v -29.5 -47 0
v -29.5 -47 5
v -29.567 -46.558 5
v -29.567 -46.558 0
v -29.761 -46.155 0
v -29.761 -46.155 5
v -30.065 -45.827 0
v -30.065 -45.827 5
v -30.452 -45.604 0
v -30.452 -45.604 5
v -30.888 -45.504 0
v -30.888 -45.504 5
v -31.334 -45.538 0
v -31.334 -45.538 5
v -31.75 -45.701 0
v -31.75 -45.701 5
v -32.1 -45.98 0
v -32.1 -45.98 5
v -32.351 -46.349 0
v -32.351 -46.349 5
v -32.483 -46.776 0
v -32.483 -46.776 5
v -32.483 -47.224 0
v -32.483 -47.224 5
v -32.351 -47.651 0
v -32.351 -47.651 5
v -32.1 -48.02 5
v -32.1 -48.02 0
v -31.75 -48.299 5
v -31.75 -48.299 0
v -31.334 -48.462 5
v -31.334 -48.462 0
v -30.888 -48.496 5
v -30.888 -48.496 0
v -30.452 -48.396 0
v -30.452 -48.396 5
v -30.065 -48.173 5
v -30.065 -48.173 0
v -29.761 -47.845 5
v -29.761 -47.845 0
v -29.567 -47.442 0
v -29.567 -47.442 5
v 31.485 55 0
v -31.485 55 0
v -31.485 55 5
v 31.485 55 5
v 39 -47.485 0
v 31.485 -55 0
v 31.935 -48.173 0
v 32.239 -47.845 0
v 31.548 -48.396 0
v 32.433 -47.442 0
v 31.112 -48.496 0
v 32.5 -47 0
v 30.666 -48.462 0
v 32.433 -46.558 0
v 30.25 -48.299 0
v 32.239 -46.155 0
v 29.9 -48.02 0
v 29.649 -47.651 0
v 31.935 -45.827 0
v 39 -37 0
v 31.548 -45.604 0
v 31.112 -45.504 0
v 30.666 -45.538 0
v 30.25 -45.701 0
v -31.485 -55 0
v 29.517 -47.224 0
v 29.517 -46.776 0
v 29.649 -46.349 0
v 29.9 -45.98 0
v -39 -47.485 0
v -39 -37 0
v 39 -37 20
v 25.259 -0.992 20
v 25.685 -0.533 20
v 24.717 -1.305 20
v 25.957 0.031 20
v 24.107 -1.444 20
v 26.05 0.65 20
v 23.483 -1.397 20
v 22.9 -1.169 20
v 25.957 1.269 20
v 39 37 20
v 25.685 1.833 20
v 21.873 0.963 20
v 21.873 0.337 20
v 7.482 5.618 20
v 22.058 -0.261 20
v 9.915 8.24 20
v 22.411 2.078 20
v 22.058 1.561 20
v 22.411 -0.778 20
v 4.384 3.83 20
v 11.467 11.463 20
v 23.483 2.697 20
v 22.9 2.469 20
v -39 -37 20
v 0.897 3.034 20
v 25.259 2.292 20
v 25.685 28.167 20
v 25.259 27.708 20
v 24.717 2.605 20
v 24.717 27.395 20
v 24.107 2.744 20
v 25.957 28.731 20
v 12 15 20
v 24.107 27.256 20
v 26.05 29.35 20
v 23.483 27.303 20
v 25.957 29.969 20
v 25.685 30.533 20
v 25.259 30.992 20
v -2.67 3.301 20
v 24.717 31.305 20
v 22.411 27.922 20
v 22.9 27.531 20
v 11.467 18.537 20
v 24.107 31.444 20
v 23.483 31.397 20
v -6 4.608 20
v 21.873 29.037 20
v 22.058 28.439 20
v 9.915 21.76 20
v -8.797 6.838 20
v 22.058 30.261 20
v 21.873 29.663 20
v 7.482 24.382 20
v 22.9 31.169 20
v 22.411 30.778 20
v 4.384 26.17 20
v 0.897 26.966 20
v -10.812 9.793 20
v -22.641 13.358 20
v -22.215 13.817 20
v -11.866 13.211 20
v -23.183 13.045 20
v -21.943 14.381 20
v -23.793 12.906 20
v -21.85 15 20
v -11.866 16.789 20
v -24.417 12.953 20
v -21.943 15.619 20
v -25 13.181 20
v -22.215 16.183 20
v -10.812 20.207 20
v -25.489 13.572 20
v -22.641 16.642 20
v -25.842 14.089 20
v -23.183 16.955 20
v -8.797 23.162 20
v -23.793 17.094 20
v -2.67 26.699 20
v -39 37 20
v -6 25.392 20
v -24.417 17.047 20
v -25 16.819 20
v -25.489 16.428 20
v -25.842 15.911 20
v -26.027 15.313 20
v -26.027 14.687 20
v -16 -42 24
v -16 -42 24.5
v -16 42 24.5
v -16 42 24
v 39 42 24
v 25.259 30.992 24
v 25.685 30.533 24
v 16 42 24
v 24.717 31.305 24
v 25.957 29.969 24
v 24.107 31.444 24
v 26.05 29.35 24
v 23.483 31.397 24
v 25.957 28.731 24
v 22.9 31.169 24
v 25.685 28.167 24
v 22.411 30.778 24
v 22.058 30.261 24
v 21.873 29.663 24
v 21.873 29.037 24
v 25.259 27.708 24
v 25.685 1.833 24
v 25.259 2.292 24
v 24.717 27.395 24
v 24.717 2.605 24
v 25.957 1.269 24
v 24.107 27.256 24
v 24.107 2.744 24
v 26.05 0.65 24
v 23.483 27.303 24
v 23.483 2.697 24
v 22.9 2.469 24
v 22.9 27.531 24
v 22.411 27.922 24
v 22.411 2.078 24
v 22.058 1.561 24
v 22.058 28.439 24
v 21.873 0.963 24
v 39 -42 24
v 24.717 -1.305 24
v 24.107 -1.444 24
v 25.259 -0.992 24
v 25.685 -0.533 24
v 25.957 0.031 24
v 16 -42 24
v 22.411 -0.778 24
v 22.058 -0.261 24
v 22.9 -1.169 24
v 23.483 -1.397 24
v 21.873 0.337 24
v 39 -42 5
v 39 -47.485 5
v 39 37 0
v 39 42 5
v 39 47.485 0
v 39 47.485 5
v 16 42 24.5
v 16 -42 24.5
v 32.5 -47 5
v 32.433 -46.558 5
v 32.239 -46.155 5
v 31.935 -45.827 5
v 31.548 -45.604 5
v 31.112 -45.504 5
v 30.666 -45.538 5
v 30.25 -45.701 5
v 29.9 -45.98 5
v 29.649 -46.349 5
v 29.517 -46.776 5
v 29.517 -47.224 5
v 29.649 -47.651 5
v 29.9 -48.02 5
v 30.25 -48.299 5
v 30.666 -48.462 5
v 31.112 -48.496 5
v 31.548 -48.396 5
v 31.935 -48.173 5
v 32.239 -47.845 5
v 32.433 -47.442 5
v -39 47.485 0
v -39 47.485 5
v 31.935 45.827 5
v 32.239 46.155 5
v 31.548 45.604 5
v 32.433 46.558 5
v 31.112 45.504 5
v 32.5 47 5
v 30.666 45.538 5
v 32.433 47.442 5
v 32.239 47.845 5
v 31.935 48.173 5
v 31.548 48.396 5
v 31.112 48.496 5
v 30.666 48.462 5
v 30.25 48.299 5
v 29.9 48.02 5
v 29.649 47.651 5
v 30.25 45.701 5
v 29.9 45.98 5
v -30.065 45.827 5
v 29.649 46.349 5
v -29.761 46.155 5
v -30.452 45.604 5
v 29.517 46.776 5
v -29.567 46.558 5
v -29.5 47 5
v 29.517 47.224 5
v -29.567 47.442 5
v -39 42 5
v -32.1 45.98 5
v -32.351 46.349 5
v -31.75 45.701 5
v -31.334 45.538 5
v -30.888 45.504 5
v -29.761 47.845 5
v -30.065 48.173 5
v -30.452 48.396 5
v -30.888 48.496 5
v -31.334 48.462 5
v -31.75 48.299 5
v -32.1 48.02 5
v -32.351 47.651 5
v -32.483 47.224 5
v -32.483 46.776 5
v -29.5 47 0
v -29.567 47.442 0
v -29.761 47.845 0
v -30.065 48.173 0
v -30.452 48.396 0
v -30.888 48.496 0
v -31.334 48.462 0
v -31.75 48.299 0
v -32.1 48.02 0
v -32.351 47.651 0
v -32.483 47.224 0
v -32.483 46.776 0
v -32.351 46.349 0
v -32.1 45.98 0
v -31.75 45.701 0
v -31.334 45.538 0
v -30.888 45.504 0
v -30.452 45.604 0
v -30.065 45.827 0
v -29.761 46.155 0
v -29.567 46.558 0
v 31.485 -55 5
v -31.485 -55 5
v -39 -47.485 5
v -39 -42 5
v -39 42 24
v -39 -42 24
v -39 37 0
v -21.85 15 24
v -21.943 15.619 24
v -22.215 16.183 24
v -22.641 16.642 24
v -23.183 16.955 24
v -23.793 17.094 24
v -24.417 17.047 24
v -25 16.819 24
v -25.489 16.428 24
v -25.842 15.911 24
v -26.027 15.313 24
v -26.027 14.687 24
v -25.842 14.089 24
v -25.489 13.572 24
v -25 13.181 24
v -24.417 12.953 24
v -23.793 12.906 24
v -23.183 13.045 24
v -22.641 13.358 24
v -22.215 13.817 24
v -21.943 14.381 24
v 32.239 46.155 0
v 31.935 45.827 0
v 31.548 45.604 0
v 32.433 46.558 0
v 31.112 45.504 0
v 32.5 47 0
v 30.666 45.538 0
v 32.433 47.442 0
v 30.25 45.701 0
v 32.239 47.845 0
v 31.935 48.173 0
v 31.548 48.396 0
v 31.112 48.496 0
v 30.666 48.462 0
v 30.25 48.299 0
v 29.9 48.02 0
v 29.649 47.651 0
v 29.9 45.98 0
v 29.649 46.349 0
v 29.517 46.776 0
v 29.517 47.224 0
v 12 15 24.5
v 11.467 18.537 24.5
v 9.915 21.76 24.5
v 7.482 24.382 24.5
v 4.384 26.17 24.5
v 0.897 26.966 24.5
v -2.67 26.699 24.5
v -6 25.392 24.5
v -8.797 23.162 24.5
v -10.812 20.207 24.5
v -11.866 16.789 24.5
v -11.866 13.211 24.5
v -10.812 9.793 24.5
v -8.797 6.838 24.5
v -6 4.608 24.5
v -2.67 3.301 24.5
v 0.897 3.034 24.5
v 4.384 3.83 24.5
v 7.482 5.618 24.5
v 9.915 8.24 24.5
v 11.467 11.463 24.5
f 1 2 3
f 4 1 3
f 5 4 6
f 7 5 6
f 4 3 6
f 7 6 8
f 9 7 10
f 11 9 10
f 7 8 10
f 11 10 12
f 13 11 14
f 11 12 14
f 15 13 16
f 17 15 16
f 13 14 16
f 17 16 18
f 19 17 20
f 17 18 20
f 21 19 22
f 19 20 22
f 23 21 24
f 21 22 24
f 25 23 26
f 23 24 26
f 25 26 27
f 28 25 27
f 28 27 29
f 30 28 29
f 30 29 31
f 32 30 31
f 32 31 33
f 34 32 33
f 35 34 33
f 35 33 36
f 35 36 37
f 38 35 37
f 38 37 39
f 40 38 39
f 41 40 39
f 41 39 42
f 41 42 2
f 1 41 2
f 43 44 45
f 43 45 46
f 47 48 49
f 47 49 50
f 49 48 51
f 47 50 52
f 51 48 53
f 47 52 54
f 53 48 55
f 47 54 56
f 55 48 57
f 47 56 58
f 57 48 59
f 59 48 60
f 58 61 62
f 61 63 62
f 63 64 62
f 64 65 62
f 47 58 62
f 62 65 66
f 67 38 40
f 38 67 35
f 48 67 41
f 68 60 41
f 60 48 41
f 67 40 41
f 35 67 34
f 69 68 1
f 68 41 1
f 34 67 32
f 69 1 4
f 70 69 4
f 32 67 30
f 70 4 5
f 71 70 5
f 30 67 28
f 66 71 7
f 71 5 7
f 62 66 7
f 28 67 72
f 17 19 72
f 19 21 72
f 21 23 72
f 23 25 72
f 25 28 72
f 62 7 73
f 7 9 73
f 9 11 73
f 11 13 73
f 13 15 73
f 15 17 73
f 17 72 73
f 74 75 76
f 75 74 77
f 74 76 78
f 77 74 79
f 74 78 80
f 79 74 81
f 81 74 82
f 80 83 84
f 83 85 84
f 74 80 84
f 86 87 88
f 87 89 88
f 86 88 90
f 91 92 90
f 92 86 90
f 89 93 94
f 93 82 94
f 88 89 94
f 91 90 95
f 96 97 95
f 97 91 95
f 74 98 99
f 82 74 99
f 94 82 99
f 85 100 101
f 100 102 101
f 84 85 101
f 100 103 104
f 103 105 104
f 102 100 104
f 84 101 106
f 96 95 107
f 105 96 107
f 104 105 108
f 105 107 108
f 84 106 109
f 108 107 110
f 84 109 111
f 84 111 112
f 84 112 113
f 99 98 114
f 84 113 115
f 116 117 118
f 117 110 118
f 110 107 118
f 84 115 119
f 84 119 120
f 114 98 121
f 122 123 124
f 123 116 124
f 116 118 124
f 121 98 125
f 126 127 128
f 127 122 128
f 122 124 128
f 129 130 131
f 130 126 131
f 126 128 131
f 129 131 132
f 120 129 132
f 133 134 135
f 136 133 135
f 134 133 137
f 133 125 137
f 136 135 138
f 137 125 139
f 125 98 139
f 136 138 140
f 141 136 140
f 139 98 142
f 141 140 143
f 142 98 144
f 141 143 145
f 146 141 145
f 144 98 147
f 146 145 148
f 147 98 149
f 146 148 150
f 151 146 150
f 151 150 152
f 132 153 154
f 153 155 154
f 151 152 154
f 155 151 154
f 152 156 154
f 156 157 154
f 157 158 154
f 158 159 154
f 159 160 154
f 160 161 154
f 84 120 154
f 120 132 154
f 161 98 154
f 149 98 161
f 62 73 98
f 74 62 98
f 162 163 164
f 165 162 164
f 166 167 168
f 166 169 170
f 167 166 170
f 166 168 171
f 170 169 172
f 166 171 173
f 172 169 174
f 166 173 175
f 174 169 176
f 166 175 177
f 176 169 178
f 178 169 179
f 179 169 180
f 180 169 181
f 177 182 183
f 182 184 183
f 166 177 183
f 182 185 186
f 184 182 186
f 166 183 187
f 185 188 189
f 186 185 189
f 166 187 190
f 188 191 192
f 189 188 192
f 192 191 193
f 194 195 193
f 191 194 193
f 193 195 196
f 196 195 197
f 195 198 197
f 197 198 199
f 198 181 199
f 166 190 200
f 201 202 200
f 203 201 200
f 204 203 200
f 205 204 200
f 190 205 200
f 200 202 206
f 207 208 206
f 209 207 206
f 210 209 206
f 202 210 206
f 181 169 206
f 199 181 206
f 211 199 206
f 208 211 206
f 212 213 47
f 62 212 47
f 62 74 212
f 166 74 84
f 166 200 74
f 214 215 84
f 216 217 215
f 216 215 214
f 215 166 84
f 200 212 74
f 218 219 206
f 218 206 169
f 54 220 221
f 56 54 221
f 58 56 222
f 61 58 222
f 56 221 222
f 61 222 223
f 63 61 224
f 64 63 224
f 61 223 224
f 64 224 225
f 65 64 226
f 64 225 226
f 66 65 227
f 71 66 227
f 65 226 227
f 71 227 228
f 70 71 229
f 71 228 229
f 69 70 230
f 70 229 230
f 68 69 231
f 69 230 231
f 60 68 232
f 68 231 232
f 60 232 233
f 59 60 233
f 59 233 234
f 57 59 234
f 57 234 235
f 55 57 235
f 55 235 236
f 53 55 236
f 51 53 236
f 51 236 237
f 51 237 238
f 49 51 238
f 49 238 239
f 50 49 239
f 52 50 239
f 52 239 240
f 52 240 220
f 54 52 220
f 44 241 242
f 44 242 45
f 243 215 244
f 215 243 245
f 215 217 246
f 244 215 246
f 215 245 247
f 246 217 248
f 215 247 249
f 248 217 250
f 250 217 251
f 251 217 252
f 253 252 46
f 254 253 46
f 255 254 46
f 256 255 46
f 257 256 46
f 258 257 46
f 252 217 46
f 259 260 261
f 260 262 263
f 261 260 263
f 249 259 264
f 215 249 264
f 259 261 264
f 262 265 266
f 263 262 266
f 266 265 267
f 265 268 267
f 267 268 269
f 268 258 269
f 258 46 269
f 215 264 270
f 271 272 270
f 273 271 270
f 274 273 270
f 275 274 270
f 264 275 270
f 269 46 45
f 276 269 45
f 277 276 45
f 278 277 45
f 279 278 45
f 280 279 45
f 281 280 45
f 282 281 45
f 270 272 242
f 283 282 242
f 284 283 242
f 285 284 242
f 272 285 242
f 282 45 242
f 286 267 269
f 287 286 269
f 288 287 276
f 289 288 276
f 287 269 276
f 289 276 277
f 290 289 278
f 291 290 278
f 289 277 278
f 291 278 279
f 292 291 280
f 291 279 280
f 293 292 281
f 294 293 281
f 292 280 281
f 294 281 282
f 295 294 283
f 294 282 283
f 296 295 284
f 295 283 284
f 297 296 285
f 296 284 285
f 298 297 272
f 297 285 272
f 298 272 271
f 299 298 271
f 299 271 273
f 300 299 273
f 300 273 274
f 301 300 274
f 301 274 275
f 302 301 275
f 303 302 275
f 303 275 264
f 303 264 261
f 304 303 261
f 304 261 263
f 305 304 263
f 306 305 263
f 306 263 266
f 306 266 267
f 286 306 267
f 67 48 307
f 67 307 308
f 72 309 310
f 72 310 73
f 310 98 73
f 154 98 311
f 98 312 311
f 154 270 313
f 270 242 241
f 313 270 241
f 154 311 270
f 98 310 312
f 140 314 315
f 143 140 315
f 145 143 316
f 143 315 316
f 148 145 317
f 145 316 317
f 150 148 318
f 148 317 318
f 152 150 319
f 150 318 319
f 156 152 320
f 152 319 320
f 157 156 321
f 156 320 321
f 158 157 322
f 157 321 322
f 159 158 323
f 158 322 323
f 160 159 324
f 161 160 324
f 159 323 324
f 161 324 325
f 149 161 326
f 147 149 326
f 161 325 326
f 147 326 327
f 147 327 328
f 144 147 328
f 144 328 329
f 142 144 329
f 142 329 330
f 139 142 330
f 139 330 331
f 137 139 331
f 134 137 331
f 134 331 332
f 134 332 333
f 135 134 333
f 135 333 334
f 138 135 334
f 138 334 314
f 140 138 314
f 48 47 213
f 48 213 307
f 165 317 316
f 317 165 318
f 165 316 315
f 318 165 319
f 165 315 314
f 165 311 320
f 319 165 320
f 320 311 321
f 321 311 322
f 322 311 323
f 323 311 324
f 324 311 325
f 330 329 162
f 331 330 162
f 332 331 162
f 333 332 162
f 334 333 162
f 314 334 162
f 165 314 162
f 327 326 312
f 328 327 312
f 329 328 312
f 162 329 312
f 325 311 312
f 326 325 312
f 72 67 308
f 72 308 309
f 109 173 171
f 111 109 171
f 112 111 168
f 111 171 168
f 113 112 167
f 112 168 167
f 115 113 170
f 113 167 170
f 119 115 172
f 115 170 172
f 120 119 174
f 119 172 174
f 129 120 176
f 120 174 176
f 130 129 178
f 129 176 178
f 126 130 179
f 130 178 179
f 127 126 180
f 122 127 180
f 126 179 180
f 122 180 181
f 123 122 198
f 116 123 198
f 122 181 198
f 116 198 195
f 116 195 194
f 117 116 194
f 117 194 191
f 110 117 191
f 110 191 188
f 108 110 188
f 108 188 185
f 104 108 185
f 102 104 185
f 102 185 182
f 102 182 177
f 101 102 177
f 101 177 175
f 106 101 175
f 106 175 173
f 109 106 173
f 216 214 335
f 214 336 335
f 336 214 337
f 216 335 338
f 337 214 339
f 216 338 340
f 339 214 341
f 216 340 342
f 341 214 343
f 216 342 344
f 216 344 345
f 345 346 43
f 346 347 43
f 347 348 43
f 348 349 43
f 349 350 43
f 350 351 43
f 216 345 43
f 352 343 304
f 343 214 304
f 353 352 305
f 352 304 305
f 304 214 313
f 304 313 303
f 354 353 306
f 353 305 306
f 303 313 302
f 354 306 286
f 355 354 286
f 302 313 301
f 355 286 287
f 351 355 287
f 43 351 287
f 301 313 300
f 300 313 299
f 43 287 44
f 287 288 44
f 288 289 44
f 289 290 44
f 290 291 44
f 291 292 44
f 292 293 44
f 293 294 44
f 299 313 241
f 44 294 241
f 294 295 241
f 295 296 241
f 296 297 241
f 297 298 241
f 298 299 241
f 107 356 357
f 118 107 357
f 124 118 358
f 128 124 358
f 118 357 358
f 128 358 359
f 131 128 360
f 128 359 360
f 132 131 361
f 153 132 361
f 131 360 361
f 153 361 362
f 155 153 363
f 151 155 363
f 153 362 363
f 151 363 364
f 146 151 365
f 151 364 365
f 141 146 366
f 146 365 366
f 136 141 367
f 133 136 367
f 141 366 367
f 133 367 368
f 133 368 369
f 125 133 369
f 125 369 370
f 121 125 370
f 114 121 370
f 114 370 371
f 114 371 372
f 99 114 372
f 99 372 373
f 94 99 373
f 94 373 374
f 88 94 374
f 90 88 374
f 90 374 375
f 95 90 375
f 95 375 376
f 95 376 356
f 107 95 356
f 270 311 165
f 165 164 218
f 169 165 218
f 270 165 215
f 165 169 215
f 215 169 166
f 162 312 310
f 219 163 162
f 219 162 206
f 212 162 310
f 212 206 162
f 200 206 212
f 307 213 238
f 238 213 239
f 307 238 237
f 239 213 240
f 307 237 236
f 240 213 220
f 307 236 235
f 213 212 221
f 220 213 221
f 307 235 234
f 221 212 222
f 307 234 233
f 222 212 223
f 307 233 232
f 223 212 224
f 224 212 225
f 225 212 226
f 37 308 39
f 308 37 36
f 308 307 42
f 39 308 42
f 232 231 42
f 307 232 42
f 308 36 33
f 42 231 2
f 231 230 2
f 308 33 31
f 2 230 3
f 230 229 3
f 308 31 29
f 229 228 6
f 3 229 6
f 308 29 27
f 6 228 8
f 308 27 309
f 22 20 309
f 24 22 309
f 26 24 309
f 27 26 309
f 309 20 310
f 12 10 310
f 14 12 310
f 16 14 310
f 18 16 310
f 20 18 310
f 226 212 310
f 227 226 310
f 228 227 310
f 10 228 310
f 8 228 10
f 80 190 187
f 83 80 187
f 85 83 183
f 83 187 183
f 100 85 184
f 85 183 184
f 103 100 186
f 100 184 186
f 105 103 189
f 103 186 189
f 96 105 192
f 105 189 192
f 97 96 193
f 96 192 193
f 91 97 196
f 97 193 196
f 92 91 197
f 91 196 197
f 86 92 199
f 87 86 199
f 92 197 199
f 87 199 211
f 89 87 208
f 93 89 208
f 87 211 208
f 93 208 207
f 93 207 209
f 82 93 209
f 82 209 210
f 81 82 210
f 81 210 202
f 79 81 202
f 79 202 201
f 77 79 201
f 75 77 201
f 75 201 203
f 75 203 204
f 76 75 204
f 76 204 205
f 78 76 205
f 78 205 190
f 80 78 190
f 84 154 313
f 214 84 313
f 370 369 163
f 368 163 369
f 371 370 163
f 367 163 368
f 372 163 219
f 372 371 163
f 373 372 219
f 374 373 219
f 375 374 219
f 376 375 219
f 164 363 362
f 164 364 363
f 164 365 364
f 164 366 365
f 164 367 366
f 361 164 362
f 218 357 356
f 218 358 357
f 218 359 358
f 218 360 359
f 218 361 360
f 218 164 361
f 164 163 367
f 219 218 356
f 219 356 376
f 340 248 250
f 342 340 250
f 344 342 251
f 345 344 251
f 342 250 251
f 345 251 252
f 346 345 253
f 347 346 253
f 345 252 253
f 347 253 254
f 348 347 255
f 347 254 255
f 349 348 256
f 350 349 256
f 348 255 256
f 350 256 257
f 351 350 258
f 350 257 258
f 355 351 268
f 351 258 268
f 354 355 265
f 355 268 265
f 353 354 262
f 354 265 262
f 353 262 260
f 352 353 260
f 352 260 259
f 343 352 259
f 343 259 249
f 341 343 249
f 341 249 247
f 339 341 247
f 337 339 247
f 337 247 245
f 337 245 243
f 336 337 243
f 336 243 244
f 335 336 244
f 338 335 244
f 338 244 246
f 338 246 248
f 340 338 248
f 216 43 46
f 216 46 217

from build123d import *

# Parameters (mm, degrees)
EXTRUDE_1_DEPTH     = 5
EXTRUDE_1_2_DEPTH   = 5
EXTRUDE_2_DEPTH     = 78
CUT_EXTRUDE_1_REACH = 73.568
SKETCH_4_R          = 12
EXTRUDE_START       = 0.5
SKETCH_5_W          = 32
SKETCH_5_H          = 84
SKETCH_5_R          = 12
EXTRUDE_3_DEPTH     = 0.5
CUT_EXTRUDE_2_REACH = 73.568
SKETCH_6_R          = 2.1
CUT_EXTRUDE_3_REACH = 72.187
SKETCH_7_R          = 1.5


with BuildPart() as part:
    # 草图2 → 凸台-拉伸1 (new body)
    with BuildSketch(Plane.XY):
        Polygon((39, 42), (-39, 42), (-39, 47.485281374), (-31.485281374, 55), (31.485281374, 55), (39, 47.485281374), align=None)
    extrude(amount=EXTRUDE_1_DEPTH)



with BuildPart() as body_2:
    # 草图2 → Extrude 1 2 (new body)
    with BuildSketch(Plane.XY):
        Polygon((31.485281374, -55), (-31.485281374, -55), (-39, -47.485281374), (-39, -42), (39, -42), (39, -47.485281374), align=None)
    extrude(amount=EXTRUDE_1_2_DEPTH)


with BuildPart() as part_1:
    add(part.part)

    add(body_2.part)  # 凸台-拉伸2 merges body 2
    # 草图3 → 凸台-拉伸2 (add)
    with BuildSketch(Plane.ZY.offset(39)):
        Polygon((0, 42), (24, 42), (24, -42), (0, -42), (0, -37), (20, -37), (20, 37), (0, 37), align=None)
    extrude(amount=-EXTRUDE_2_DEPTH)

    # 草图4 → 切除-拉伸1 (cut, up to next)
    with BuildSketch(Plane.XY.offset(24), mode=Mode.PRIVATE) as cut_extrude_1_sk1:
        with Locations((0, 15)):
            Circle(SKETCH_4_R)
    cut_extrude_1_tool1 = extrude(cut_extrude_1_sk1.sketch, amount=-CUT_EXTRUDE_1_REACH, mode=Mode.PRIVATE) & part_1.part
    add(cut_extrude_1_tool1.solids().sort_by_distance((0, 15, 24))[0], mode=Mode.SUBTRACT)

    # 草图5 → 凸台-拉伸3 (add)
    with BuildSketch(Plane.XY.offset(24).offset(EXTRUDE_START)):
        Rectangle(SKETCH_5_W, SKETCH_5_H)
        with Locations((0, 15)):
            Circle(SKETCH_5_R, mode=Mode.SUBTRACT)
    extrude(amount=-EXTRUDE_3_DEPTH)

    # 草图6 → 切除-拉伸2 (cut, up to next)
    with BuildSketch(Plane.XY.offset(24), mode=Mode.PRIVATE) as cut_extrude_2_sk1:
        with Locations((-23.95, 15)):
            Circle(SKETCH_6_R)
    cut_extrude_2_tool1 = extrude(cut_extrude_2_sk1.sketch, amount=-CUT_EXTRUDE_2_REACH, mode=Mode.PRIVATE) & part_1.part
    # 草图6 → 切除-拉伸2 (cut, up to next)
    with BuildSketch(Plane.XY.offset(24), mode=Mode.PRIVATE) as cut_extrude_2_sk2:
        with Locations((23.95, 29.35)):
            Circle(SKETCH_6_R)
    cut_extrude_2_tool2 = extrude(cut_extrude_2_sk2.sketch, amount=-CUT_EXTRUDE_2_REACH, mode=Mode.PRIVATE) & part_1.part
    # 草图6 → 切除-拉伸2 (cut, up to next)
    with BuildSketch(Plane.XY.offset(24), mode=Mode.PRIVATE) as cut_extrude_2_sk3:
        with Locations((23.95, 0.65)):
            Circle(SKETCH_6_R)
    cut_extrude_2_tool3 = extrude(cut_extrude_2_sk3.sketch, amount=-CUT_EXTRUDE_2_REACH, mode=Mode.PRIVATE) & part_1.part
    add(cut_extrude_2_tool1.solids().sort_by_distance((-23.95, 15, 24))[0], mode=Mode.SUBTRACT)
    add(cut_extrude_2_tool2.solids().sort_by_distance((23.95, 29.35, 24))[0], mode=Mode.SUBTRACT)
    add(cut_extrude_2_tool3.solids().sort_by_distance((23.95, 0.65, 24))[0], mode=Mode.SUBTRACT)

    # 草图7 → 切除-拉伸3 (cut, up to next)
    with BuildSketch(Plane.XY.offset(5), mode=Mode.PRIVATE) as cut_extrude_3_sk1:
        with Locations((-31, 47)):
            Circle(SKETCH_7_R)
    cut_extrude_3_tool1 = extrude(cut_extrude_3_sk1.sketch, amount=-CUT_EXTRUDE_3_REACH, mode=Mode.PRIVATE) & part_1.part
    # 草图7 → 切除-拉伸3 (cut, up to next)
    with BuildSketch(Plane.XY.offset(5), mode=Mode.PRIVATE) as cut_extrude_3_sk2:
        with Locations((31, 47)):
            Circle(SKETCH_7_R)
    cut_extrude_3_tool2 = extrude(cut_extrude_3_sk2.sketch, amount=-CUT_EXTRUDE_3_REACH, mode=Mode.PRIVATE) & part_1.part
    # 草图7 → 切除-拉伸3 (cut, up to next)
    with BuildSketch(Plane.XY.offset(5), mode=Mode.PRIVATE) as cut_extrude_3_sk3:
        with Locations((31, -47)):
            Circle(SKETCH_7_R)
    cut_extrude_3_tool3 = extrude(cut_extrude_3_sk3.sketch, amount=-CUT_EXTRUDE_3_REACH, mode=Mode.PRIVATE) & part_1.part
    # 草图7 → 切除-拉伸3 (cut, up to next)
    with BuildSketch(Plane.XY.offset(5), mode=Mode.PRIVATE) as cut_extrude_3_sk4:
        with Locations((-31, -47)):
            Circle(SKETCH_7_R)
    cut_extrude_3_tool4 = extrude(cut_extrude_3_sk4.sketch, amount=-CUT_EXTRUDE_3_REACH, mode=Mode.PRIVATE) & part_1.part
    add(cut_extrude_3_tool1.solids().sort_by_distance((-31, 47, 5))[0], mode=Mode.SUBTRACT)
    add(cut_extrude_3_tool2.solids().sort_by_distance((31, 47, 5))[0], mode=Mode.SUBTRACT)
    add(cut_extrude_3_tool3.solids().sort_by_distance((31, -47, 5))[0], mode=Mode.SUBTRACT)
    add(cut_extrude_3_tool4.solids().sort_by_distance((-31, -47, 5))[0], mode=Mode.SUBTRACT)


solid = part_1.part
